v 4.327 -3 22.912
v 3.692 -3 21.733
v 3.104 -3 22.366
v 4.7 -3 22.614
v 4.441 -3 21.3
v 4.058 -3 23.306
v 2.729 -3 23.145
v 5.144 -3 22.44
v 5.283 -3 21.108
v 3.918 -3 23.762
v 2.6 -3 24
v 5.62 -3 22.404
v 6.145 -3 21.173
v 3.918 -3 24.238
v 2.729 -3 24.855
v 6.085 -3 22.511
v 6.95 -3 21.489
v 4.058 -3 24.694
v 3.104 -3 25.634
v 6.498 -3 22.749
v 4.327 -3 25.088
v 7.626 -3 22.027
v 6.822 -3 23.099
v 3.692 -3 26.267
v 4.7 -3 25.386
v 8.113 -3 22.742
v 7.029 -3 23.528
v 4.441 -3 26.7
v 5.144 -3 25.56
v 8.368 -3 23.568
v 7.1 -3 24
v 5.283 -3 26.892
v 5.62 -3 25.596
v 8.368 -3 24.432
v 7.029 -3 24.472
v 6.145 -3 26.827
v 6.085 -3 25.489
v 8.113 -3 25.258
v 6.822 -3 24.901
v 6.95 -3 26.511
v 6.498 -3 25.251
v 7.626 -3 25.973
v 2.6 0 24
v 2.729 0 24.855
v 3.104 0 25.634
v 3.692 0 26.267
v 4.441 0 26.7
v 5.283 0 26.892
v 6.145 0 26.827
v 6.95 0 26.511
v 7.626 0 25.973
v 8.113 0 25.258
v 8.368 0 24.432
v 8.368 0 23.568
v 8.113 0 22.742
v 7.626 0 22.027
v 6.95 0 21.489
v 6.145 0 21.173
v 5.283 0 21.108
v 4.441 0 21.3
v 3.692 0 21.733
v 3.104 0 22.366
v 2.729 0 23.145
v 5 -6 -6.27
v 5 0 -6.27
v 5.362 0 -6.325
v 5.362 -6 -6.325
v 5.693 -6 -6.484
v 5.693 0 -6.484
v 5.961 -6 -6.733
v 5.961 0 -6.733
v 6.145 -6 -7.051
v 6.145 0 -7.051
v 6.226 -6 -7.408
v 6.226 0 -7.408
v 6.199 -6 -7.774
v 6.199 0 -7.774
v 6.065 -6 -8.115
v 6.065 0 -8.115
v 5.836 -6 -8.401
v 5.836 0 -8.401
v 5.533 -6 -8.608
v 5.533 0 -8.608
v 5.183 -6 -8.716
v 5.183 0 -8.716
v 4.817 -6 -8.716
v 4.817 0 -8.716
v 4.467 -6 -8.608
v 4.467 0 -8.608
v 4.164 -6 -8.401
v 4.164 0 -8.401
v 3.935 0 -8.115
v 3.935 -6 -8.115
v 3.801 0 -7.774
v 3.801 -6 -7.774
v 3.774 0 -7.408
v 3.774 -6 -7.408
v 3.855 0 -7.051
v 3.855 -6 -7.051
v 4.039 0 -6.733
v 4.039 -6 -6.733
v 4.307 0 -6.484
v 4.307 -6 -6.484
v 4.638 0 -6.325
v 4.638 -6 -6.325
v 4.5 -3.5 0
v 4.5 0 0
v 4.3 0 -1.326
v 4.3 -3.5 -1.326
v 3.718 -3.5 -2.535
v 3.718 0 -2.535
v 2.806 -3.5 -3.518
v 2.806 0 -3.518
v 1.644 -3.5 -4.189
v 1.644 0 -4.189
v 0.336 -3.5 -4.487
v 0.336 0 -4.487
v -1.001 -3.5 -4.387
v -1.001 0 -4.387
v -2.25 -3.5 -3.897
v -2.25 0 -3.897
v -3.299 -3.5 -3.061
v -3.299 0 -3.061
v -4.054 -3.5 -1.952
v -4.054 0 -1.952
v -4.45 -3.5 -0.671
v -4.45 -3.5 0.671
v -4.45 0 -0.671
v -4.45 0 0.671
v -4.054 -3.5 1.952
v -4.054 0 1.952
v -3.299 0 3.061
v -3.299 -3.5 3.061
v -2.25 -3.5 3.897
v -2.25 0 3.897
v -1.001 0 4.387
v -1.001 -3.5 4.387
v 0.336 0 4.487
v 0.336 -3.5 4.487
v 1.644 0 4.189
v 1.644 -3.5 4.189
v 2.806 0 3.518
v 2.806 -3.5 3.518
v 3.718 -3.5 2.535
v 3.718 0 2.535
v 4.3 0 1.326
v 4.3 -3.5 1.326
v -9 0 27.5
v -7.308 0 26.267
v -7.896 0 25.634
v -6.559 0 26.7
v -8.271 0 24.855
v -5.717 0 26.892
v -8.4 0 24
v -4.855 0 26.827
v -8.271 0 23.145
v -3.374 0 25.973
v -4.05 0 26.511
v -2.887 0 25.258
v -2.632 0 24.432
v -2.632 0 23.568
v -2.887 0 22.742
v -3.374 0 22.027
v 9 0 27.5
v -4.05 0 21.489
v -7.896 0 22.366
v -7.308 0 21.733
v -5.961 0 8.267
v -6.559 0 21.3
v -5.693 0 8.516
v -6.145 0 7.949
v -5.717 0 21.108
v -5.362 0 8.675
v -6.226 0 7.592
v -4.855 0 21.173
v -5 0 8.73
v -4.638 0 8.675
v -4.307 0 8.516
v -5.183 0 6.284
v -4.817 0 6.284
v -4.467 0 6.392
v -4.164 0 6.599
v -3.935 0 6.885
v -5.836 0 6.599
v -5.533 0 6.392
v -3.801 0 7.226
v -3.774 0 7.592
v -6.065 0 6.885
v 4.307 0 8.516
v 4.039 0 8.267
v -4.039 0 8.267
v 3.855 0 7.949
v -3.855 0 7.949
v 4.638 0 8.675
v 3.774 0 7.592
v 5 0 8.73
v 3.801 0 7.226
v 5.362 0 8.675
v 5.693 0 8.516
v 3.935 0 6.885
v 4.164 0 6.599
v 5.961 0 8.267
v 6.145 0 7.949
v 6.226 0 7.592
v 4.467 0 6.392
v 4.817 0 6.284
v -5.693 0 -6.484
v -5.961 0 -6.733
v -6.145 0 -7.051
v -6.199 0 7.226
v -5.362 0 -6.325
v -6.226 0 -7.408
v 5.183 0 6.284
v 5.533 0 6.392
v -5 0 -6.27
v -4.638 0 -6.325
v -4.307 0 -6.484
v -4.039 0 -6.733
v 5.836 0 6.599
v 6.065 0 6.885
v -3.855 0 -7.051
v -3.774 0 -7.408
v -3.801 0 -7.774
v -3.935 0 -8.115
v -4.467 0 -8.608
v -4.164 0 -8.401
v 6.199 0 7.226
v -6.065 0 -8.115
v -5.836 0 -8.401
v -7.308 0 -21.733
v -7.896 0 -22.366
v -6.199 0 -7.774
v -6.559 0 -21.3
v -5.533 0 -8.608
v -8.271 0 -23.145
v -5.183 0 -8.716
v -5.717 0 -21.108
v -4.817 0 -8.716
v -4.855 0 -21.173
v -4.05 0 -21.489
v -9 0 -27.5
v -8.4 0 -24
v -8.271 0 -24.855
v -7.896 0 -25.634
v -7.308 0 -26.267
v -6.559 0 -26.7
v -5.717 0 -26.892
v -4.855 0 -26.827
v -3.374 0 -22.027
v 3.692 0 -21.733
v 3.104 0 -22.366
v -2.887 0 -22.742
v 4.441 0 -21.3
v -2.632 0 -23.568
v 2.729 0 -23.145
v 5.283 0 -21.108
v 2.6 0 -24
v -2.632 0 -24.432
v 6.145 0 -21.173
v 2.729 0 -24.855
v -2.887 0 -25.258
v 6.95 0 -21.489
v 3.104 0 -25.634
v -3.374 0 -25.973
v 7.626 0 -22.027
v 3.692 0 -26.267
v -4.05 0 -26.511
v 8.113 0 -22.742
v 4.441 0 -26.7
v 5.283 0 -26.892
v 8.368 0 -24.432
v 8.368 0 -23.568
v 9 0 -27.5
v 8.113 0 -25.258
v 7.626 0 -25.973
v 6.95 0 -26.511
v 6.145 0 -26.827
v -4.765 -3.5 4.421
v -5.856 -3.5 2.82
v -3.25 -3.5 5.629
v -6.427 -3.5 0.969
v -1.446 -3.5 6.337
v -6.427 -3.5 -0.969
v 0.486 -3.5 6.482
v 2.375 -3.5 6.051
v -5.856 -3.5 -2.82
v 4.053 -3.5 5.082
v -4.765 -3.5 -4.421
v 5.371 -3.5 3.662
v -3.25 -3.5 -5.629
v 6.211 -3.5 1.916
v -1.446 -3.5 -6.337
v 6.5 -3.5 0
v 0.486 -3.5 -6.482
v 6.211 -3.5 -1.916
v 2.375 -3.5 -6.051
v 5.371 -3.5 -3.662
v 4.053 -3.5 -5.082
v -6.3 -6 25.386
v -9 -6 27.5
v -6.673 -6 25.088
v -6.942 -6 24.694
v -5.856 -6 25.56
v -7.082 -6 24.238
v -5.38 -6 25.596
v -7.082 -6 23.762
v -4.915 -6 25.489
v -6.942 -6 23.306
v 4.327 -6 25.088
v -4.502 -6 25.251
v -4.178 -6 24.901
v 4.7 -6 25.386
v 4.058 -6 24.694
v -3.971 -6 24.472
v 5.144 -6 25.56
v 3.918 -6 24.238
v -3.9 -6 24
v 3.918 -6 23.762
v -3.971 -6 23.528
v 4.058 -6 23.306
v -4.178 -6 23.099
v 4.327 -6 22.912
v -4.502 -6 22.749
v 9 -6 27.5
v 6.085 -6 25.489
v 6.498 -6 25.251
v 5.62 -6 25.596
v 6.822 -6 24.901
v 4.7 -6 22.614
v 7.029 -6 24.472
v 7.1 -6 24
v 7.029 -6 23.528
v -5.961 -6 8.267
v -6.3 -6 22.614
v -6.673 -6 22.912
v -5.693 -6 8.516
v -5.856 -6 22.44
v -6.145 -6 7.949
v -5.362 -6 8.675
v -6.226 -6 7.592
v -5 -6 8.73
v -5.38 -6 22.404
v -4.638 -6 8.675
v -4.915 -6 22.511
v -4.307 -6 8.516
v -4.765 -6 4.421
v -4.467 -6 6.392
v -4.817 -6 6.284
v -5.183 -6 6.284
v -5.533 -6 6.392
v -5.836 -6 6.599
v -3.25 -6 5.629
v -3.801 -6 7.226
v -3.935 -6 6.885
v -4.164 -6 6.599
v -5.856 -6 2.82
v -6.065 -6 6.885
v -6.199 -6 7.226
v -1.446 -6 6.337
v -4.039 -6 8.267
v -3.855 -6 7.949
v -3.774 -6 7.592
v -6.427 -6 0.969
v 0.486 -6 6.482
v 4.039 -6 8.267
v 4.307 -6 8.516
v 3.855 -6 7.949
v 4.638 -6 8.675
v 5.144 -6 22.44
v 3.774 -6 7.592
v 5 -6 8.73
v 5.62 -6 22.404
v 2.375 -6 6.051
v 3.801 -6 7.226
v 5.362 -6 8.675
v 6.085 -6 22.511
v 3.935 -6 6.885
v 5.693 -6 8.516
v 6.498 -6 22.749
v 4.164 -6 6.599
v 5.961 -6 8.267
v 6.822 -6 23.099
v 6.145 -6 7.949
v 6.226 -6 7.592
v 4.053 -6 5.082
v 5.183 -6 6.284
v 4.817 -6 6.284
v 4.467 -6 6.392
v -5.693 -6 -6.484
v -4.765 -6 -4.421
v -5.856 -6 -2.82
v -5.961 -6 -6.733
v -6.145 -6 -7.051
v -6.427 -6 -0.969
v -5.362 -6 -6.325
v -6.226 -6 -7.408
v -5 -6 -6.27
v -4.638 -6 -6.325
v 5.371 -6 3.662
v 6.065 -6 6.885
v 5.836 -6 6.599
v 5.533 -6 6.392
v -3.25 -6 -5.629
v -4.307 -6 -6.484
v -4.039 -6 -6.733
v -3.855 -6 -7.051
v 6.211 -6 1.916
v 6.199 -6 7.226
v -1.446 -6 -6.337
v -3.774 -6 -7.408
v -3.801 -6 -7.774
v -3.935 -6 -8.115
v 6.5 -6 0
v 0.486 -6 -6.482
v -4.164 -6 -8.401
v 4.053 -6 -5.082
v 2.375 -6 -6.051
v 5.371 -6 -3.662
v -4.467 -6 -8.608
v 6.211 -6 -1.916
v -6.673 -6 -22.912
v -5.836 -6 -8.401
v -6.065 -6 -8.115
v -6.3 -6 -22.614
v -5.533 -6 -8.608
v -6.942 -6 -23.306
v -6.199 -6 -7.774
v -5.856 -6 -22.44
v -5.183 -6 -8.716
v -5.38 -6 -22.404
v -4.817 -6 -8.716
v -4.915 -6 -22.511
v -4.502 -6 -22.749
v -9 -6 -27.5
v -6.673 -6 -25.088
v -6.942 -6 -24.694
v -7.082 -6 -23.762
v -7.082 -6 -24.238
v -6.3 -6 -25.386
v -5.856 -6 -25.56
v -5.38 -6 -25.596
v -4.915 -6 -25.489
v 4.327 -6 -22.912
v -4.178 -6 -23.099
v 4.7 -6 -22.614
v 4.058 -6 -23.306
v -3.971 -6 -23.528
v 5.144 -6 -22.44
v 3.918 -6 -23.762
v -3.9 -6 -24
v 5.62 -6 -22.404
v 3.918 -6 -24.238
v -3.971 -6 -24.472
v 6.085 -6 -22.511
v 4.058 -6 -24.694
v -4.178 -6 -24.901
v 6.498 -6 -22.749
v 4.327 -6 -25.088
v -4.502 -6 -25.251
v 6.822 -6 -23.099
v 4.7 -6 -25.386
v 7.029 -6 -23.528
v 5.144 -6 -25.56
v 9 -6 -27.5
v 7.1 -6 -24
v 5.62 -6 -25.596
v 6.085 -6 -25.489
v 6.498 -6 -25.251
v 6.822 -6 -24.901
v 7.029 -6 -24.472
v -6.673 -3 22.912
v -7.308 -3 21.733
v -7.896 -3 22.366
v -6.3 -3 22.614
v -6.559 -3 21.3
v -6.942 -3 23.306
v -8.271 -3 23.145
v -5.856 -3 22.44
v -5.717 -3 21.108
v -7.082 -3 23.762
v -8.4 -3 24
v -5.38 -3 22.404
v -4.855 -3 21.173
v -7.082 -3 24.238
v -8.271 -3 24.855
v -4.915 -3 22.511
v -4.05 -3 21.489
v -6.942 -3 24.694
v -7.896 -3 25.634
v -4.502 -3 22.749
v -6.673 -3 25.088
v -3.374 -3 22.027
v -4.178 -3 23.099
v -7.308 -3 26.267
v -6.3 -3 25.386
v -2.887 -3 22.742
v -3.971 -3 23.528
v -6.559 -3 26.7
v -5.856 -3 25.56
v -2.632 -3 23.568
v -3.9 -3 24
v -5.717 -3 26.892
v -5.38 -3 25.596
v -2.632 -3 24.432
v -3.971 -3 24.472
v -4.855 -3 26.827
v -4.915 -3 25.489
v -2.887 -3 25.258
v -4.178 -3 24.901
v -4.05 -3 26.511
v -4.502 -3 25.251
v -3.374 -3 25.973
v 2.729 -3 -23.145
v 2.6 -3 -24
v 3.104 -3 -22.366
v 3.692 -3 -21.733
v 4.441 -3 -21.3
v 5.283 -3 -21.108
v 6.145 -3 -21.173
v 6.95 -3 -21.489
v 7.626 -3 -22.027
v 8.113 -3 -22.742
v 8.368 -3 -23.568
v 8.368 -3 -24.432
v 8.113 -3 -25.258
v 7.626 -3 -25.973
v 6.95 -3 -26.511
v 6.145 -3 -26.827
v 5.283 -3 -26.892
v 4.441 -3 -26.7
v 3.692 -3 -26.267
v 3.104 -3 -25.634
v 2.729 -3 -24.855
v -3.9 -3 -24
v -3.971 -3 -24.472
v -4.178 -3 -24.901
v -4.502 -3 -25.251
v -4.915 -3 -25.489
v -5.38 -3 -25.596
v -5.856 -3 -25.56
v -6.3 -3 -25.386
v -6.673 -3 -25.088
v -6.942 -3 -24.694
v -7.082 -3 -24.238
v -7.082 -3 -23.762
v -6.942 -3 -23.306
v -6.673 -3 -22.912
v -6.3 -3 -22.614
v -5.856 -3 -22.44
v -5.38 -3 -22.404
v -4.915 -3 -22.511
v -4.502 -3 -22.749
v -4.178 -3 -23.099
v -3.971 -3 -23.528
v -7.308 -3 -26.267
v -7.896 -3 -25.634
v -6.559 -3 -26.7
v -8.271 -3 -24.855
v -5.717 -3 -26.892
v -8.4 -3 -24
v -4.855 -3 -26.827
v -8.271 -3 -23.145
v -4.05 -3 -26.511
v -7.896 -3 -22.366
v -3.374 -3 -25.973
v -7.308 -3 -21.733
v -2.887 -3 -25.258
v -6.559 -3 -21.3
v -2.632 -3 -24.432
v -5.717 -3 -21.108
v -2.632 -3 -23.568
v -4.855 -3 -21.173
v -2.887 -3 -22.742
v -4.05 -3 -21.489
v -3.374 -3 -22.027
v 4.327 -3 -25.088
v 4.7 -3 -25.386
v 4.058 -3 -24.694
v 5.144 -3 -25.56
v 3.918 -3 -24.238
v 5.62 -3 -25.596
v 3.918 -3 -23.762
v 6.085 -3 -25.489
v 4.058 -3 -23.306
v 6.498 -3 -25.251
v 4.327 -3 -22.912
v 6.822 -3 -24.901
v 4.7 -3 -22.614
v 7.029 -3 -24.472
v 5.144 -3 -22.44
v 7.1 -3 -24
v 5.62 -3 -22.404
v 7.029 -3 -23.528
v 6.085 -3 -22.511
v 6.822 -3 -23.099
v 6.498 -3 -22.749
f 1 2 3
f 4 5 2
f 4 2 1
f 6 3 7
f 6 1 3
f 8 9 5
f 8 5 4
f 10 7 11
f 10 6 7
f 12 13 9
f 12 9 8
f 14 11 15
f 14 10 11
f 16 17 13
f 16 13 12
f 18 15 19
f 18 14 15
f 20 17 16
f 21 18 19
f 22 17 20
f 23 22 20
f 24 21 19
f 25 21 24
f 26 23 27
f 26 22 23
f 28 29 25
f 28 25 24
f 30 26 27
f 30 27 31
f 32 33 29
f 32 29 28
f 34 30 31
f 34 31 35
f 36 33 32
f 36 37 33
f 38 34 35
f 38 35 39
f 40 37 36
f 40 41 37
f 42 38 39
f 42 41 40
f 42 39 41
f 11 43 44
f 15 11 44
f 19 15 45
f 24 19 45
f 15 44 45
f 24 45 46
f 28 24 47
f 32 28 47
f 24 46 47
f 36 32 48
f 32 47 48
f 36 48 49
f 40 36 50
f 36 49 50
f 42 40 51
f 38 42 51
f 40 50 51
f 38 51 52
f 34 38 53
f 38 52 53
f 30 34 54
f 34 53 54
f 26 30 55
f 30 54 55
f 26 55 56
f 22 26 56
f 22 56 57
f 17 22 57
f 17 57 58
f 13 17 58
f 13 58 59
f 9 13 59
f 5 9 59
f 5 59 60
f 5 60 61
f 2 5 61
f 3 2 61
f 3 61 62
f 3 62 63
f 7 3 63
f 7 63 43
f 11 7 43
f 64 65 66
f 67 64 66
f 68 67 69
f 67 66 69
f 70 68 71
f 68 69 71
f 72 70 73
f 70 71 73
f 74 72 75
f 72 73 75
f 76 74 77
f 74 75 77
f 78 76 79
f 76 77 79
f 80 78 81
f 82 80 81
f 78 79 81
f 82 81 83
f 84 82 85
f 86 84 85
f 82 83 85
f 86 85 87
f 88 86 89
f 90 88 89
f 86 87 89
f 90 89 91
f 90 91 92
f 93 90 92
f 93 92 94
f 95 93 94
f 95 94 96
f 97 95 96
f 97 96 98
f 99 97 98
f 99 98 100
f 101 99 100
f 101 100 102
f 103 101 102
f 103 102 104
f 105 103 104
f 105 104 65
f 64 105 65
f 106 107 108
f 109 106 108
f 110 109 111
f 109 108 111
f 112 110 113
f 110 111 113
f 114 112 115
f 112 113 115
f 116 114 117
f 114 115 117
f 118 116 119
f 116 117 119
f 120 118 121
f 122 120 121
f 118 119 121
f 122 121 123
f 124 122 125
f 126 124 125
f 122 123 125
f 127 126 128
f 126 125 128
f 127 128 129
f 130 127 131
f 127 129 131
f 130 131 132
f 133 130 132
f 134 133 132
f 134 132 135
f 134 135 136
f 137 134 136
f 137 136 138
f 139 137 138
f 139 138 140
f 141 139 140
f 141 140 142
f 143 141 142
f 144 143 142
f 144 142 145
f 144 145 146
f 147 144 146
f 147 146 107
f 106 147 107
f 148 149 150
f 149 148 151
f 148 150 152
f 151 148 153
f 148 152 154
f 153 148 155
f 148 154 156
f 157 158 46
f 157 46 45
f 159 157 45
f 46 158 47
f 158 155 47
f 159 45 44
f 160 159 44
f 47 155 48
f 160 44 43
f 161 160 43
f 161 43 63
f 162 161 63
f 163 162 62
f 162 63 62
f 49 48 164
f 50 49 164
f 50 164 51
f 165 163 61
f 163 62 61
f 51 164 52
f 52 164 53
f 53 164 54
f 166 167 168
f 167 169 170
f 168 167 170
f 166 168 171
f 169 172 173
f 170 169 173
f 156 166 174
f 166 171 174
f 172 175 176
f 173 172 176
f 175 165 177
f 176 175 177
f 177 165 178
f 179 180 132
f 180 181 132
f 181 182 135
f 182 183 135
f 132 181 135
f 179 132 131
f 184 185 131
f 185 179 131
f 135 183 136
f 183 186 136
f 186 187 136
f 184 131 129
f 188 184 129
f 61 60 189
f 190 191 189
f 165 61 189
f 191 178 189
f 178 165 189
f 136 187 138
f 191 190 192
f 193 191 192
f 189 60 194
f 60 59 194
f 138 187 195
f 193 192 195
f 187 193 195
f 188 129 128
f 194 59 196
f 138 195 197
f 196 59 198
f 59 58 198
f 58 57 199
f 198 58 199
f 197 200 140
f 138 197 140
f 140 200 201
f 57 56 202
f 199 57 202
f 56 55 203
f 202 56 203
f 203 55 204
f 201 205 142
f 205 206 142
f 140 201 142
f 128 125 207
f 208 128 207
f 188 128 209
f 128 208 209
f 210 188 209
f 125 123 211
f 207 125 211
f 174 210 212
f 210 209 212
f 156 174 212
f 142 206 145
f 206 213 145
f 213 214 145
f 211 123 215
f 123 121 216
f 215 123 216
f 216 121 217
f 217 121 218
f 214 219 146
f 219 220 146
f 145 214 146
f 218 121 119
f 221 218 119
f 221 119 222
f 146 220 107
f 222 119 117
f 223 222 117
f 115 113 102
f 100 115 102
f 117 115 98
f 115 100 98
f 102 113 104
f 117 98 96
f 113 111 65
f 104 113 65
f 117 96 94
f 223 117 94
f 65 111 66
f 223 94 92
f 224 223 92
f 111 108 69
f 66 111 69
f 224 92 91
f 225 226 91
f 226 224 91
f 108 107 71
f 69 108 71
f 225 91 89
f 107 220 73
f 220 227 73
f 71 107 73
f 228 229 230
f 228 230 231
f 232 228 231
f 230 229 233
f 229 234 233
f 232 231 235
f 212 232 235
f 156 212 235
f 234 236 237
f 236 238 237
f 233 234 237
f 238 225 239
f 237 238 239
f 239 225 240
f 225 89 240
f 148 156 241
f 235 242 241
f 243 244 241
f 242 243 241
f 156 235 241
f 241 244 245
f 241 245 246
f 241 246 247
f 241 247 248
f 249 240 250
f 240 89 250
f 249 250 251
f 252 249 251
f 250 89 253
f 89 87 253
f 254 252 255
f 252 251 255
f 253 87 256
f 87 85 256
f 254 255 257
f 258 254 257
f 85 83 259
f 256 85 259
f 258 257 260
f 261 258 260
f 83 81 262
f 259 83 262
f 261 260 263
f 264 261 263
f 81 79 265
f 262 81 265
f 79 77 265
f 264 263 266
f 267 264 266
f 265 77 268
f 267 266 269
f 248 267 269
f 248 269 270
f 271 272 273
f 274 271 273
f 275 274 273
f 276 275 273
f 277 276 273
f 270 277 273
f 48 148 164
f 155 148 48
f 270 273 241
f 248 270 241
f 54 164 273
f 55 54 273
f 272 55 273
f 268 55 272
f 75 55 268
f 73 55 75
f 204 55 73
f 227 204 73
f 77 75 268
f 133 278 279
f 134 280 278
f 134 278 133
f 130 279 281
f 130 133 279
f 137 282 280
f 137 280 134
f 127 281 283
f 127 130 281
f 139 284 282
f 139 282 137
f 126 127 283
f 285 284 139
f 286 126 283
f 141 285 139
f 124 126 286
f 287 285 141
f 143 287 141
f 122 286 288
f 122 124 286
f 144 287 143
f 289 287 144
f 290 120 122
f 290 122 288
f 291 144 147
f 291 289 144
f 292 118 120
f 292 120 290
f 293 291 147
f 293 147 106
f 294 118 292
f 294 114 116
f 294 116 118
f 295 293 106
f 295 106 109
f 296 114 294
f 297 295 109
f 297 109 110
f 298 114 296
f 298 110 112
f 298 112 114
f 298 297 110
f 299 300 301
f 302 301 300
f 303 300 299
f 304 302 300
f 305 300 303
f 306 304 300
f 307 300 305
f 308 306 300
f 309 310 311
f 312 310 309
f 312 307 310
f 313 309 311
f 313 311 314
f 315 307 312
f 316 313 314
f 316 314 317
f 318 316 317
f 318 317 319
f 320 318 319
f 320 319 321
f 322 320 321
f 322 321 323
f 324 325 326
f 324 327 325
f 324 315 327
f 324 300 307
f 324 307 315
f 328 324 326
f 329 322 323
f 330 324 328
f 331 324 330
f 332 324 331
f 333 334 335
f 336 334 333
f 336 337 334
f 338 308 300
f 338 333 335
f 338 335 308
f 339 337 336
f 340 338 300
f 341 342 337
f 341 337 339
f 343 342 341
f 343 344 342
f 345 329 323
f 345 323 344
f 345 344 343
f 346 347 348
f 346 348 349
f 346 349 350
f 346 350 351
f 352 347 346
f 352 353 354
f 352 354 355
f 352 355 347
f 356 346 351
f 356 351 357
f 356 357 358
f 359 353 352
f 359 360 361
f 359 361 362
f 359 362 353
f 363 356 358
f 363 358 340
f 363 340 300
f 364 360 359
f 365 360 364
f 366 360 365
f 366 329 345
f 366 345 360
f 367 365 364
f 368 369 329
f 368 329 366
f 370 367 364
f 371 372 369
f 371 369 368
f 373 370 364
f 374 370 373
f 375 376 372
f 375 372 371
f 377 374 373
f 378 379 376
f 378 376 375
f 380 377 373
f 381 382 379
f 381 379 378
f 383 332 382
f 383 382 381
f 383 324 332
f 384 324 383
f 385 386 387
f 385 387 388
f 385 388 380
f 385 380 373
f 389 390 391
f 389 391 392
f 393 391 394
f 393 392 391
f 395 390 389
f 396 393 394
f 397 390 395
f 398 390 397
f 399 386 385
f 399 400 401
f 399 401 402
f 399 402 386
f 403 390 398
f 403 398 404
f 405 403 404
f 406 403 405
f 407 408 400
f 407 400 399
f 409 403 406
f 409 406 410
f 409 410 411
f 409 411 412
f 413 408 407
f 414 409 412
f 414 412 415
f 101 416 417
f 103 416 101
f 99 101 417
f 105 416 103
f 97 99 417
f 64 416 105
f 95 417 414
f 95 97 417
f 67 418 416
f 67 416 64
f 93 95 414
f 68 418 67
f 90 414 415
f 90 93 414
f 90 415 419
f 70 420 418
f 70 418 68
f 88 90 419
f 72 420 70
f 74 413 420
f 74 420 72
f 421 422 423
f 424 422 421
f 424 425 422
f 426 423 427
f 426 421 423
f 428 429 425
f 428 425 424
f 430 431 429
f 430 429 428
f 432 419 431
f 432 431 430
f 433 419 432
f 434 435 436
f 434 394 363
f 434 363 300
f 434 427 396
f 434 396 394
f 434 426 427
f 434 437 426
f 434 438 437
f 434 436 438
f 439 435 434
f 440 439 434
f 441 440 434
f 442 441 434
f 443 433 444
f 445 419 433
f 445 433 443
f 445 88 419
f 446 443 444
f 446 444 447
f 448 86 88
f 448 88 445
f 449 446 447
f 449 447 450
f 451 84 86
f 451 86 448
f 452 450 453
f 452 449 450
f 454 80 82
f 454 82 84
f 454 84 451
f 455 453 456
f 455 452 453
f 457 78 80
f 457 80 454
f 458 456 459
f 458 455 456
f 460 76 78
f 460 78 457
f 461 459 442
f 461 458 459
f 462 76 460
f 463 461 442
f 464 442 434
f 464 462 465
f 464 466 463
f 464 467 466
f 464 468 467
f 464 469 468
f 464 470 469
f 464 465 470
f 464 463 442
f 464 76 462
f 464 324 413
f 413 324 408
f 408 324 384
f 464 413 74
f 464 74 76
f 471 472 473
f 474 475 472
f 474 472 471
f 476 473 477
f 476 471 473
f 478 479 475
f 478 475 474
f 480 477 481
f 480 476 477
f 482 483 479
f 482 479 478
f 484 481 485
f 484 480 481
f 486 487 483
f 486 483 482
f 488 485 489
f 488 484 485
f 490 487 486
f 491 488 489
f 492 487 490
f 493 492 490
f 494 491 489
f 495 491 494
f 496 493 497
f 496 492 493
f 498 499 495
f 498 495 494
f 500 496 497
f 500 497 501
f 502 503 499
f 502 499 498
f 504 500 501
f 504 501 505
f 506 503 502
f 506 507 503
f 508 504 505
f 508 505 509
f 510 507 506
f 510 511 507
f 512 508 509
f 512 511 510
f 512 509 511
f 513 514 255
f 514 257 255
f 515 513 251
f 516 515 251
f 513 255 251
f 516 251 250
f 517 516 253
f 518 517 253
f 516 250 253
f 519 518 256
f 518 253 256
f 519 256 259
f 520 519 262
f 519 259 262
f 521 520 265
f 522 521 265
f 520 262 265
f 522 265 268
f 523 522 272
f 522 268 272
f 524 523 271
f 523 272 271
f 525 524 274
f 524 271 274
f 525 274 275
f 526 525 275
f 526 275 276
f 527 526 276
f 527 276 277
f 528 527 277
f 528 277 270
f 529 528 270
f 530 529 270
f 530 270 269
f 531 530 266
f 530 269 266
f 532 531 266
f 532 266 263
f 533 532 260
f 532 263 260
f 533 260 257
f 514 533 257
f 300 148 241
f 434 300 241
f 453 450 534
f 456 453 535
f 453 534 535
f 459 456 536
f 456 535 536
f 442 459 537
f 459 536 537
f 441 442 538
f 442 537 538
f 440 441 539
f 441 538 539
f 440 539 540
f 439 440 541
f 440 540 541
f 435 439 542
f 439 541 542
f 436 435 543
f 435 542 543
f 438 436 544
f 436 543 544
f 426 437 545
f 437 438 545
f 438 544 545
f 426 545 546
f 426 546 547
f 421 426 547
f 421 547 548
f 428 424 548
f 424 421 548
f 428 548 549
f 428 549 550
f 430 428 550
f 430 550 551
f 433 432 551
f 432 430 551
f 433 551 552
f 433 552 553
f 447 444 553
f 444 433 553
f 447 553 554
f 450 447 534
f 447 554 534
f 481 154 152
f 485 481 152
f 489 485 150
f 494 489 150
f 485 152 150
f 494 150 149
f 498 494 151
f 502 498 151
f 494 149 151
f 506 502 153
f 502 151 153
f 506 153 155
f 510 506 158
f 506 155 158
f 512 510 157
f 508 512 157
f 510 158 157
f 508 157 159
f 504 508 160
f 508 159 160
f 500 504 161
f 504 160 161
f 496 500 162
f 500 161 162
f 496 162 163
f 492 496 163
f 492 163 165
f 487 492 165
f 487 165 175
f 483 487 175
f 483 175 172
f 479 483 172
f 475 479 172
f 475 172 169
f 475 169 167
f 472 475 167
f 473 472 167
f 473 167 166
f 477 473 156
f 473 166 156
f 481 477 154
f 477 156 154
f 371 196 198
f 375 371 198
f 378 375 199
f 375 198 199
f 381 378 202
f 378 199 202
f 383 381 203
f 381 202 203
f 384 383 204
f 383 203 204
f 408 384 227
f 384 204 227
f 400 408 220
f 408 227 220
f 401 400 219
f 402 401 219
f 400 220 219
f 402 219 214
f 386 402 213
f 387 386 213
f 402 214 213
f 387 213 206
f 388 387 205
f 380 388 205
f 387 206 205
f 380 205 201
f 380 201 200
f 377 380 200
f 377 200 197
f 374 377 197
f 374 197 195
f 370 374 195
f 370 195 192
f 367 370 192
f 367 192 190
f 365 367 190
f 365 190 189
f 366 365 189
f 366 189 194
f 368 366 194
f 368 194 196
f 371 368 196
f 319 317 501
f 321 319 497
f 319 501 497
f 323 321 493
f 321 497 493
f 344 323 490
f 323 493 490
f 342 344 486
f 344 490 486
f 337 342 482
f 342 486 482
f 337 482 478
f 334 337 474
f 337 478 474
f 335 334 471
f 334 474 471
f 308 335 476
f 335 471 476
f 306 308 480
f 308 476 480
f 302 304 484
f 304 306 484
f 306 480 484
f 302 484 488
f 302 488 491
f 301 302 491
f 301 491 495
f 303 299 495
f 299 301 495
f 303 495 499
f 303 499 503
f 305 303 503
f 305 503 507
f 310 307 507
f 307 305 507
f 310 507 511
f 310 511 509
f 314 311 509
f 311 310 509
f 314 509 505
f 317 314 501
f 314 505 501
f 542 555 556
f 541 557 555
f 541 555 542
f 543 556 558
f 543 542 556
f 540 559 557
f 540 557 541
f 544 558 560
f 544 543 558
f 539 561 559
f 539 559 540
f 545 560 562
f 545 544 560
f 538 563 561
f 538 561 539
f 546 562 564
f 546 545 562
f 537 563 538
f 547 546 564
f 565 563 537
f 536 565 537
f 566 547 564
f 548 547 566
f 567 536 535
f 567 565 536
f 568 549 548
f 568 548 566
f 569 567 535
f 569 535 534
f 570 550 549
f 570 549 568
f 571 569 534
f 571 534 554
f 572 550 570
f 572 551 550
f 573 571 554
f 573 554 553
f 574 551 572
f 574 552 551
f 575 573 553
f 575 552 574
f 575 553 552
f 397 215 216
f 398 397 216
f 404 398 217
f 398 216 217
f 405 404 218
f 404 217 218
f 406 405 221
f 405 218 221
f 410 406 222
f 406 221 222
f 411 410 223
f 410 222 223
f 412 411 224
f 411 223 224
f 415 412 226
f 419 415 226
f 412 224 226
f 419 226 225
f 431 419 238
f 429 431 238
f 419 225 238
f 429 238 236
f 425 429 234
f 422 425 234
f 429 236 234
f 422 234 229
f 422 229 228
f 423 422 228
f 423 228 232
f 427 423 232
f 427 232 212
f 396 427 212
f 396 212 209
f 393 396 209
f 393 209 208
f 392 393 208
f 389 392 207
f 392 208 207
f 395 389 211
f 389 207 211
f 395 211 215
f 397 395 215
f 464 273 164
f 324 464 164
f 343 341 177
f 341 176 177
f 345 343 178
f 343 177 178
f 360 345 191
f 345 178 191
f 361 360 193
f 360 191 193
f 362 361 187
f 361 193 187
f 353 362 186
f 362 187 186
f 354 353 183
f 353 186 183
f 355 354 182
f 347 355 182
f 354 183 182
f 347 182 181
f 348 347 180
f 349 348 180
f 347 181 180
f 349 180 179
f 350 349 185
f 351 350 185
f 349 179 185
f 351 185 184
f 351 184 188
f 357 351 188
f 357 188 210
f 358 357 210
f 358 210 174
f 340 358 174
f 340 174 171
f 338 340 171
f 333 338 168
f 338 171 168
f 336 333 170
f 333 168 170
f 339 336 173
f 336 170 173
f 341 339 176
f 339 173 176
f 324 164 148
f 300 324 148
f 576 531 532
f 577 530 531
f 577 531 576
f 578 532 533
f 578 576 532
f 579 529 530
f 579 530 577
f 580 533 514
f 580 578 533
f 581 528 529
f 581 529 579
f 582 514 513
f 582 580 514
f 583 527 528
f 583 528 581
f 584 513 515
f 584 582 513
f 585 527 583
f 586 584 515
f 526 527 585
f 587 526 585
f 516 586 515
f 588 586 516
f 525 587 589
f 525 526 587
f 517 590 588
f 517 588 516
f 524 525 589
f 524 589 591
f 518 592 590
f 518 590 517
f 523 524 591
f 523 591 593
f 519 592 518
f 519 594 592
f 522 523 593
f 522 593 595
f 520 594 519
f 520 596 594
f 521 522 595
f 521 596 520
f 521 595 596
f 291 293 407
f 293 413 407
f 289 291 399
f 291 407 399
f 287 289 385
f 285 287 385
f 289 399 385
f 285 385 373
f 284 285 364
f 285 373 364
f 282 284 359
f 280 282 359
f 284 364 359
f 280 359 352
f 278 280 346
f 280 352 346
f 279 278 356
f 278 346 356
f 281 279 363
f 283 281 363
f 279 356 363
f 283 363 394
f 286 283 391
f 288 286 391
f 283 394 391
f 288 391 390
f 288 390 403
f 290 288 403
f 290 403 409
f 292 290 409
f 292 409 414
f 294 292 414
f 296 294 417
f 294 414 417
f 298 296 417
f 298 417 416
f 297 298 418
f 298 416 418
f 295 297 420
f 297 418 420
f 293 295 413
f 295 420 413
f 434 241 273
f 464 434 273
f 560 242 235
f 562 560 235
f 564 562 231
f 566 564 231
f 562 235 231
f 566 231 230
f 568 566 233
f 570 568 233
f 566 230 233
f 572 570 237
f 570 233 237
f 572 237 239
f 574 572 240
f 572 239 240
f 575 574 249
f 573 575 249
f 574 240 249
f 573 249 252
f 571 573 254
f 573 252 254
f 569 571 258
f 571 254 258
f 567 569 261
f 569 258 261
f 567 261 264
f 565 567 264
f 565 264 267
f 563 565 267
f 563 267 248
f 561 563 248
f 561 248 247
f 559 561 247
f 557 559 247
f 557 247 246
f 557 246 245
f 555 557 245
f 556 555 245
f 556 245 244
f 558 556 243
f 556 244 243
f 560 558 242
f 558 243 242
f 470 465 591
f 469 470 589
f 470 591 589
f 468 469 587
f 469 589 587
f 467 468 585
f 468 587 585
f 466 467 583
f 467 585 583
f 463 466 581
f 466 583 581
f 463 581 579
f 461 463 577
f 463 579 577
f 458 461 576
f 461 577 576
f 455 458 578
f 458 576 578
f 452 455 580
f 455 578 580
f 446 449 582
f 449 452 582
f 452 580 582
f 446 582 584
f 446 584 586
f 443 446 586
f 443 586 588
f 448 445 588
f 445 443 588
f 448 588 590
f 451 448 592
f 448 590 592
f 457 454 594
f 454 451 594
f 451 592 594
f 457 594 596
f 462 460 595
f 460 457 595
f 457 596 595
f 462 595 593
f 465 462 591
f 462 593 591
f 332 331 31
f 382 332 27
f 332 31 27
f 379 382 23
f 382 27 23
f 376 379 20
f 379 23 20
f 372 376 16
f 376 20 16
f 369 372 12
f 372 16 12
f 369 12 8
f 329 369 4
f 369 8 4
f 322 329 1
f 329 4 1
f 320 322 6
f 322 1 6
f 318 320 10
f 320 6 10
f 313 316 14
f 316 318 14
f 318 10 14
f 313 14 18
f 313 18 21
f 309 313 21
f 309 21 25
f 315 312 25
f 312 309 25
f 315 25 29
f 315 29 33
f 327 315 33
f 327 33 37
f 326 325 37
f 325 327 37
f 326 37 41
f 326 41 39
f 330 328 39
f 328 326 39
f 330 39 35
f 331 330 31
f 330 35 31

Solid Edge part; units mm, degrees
sketch "Sketch1" plane through (0, 0, 0) normal (0, -1, 0) x (1, 0, 0)
  circle A0 centre (0, 0) radius 4.5
  circle A1 centre (-5.5, 24) radius 1.6
  circle A2 centre (5.5, 24) radius 1.6
  circle A3 centre (-5.5, -24) radius 1.6
  circle A4 centre (5.5, -24) radius 1.6
  line L0 (-9, -27.5) -> (9, -27.5)
  line L1 (9, -27.5) -> (9, 27.5)
  line L2 (9, 27.5) -> (-9, 27.5)
  line L3 (-9, 27.5) -> (-9, -27.5)
  dimension "D1" = 55
  dimension "D2" = 18
  dimension "D3" = 48
  dimension "D4" = 24
  dimension "D5" = 11
  dimension "D6" = 5.5
  dimension "D7" = 48
  dimension "D8" = 11
extrude "Protrusion1" add sketch "Sketch1" along normal blind 6
sketch "Sketch2" plane through (0, -6, 0) normal (0, -1, 0) x (1, 0, 0)
  circle A0 centre (0, 0) radius 6.5
extrude "ExtrudedCutout_1" cut sketch "Sketch2" against normal blind 2.5
hole "Hole_5" at (-5, 0, -7.5) direction (0, -1, 0) diameter 2.459 end up to next
hole "Hole1" at (-5, 0, 7.5) direction (0, -1, 0) diameter 2.459 end up to next
hole "Hole2" at (5, 0, 7.5) direction (0, -1, 0) diameter 2.459 end up to next
hole "Hole3" at (5, 0, -7.5) direction (0, -1, 0) diameter 2.459 end up to next
sketch "Sketch3" plane through (0, 0, 0) normal (0, 1, 0) x (-1, 0, 0)
  circle A0 centre (-5.5, -24) radius 2.9
  circle A1 centre (5.5, -24) radius 2.9
  circle A2 centre (5.5, 24) radius 2.9
  circle A3 centre (-5.5, 24) radius 2.9
extrude "ExtrudedCutout_2" cut sketch "Sketch3" against normal blind 3
